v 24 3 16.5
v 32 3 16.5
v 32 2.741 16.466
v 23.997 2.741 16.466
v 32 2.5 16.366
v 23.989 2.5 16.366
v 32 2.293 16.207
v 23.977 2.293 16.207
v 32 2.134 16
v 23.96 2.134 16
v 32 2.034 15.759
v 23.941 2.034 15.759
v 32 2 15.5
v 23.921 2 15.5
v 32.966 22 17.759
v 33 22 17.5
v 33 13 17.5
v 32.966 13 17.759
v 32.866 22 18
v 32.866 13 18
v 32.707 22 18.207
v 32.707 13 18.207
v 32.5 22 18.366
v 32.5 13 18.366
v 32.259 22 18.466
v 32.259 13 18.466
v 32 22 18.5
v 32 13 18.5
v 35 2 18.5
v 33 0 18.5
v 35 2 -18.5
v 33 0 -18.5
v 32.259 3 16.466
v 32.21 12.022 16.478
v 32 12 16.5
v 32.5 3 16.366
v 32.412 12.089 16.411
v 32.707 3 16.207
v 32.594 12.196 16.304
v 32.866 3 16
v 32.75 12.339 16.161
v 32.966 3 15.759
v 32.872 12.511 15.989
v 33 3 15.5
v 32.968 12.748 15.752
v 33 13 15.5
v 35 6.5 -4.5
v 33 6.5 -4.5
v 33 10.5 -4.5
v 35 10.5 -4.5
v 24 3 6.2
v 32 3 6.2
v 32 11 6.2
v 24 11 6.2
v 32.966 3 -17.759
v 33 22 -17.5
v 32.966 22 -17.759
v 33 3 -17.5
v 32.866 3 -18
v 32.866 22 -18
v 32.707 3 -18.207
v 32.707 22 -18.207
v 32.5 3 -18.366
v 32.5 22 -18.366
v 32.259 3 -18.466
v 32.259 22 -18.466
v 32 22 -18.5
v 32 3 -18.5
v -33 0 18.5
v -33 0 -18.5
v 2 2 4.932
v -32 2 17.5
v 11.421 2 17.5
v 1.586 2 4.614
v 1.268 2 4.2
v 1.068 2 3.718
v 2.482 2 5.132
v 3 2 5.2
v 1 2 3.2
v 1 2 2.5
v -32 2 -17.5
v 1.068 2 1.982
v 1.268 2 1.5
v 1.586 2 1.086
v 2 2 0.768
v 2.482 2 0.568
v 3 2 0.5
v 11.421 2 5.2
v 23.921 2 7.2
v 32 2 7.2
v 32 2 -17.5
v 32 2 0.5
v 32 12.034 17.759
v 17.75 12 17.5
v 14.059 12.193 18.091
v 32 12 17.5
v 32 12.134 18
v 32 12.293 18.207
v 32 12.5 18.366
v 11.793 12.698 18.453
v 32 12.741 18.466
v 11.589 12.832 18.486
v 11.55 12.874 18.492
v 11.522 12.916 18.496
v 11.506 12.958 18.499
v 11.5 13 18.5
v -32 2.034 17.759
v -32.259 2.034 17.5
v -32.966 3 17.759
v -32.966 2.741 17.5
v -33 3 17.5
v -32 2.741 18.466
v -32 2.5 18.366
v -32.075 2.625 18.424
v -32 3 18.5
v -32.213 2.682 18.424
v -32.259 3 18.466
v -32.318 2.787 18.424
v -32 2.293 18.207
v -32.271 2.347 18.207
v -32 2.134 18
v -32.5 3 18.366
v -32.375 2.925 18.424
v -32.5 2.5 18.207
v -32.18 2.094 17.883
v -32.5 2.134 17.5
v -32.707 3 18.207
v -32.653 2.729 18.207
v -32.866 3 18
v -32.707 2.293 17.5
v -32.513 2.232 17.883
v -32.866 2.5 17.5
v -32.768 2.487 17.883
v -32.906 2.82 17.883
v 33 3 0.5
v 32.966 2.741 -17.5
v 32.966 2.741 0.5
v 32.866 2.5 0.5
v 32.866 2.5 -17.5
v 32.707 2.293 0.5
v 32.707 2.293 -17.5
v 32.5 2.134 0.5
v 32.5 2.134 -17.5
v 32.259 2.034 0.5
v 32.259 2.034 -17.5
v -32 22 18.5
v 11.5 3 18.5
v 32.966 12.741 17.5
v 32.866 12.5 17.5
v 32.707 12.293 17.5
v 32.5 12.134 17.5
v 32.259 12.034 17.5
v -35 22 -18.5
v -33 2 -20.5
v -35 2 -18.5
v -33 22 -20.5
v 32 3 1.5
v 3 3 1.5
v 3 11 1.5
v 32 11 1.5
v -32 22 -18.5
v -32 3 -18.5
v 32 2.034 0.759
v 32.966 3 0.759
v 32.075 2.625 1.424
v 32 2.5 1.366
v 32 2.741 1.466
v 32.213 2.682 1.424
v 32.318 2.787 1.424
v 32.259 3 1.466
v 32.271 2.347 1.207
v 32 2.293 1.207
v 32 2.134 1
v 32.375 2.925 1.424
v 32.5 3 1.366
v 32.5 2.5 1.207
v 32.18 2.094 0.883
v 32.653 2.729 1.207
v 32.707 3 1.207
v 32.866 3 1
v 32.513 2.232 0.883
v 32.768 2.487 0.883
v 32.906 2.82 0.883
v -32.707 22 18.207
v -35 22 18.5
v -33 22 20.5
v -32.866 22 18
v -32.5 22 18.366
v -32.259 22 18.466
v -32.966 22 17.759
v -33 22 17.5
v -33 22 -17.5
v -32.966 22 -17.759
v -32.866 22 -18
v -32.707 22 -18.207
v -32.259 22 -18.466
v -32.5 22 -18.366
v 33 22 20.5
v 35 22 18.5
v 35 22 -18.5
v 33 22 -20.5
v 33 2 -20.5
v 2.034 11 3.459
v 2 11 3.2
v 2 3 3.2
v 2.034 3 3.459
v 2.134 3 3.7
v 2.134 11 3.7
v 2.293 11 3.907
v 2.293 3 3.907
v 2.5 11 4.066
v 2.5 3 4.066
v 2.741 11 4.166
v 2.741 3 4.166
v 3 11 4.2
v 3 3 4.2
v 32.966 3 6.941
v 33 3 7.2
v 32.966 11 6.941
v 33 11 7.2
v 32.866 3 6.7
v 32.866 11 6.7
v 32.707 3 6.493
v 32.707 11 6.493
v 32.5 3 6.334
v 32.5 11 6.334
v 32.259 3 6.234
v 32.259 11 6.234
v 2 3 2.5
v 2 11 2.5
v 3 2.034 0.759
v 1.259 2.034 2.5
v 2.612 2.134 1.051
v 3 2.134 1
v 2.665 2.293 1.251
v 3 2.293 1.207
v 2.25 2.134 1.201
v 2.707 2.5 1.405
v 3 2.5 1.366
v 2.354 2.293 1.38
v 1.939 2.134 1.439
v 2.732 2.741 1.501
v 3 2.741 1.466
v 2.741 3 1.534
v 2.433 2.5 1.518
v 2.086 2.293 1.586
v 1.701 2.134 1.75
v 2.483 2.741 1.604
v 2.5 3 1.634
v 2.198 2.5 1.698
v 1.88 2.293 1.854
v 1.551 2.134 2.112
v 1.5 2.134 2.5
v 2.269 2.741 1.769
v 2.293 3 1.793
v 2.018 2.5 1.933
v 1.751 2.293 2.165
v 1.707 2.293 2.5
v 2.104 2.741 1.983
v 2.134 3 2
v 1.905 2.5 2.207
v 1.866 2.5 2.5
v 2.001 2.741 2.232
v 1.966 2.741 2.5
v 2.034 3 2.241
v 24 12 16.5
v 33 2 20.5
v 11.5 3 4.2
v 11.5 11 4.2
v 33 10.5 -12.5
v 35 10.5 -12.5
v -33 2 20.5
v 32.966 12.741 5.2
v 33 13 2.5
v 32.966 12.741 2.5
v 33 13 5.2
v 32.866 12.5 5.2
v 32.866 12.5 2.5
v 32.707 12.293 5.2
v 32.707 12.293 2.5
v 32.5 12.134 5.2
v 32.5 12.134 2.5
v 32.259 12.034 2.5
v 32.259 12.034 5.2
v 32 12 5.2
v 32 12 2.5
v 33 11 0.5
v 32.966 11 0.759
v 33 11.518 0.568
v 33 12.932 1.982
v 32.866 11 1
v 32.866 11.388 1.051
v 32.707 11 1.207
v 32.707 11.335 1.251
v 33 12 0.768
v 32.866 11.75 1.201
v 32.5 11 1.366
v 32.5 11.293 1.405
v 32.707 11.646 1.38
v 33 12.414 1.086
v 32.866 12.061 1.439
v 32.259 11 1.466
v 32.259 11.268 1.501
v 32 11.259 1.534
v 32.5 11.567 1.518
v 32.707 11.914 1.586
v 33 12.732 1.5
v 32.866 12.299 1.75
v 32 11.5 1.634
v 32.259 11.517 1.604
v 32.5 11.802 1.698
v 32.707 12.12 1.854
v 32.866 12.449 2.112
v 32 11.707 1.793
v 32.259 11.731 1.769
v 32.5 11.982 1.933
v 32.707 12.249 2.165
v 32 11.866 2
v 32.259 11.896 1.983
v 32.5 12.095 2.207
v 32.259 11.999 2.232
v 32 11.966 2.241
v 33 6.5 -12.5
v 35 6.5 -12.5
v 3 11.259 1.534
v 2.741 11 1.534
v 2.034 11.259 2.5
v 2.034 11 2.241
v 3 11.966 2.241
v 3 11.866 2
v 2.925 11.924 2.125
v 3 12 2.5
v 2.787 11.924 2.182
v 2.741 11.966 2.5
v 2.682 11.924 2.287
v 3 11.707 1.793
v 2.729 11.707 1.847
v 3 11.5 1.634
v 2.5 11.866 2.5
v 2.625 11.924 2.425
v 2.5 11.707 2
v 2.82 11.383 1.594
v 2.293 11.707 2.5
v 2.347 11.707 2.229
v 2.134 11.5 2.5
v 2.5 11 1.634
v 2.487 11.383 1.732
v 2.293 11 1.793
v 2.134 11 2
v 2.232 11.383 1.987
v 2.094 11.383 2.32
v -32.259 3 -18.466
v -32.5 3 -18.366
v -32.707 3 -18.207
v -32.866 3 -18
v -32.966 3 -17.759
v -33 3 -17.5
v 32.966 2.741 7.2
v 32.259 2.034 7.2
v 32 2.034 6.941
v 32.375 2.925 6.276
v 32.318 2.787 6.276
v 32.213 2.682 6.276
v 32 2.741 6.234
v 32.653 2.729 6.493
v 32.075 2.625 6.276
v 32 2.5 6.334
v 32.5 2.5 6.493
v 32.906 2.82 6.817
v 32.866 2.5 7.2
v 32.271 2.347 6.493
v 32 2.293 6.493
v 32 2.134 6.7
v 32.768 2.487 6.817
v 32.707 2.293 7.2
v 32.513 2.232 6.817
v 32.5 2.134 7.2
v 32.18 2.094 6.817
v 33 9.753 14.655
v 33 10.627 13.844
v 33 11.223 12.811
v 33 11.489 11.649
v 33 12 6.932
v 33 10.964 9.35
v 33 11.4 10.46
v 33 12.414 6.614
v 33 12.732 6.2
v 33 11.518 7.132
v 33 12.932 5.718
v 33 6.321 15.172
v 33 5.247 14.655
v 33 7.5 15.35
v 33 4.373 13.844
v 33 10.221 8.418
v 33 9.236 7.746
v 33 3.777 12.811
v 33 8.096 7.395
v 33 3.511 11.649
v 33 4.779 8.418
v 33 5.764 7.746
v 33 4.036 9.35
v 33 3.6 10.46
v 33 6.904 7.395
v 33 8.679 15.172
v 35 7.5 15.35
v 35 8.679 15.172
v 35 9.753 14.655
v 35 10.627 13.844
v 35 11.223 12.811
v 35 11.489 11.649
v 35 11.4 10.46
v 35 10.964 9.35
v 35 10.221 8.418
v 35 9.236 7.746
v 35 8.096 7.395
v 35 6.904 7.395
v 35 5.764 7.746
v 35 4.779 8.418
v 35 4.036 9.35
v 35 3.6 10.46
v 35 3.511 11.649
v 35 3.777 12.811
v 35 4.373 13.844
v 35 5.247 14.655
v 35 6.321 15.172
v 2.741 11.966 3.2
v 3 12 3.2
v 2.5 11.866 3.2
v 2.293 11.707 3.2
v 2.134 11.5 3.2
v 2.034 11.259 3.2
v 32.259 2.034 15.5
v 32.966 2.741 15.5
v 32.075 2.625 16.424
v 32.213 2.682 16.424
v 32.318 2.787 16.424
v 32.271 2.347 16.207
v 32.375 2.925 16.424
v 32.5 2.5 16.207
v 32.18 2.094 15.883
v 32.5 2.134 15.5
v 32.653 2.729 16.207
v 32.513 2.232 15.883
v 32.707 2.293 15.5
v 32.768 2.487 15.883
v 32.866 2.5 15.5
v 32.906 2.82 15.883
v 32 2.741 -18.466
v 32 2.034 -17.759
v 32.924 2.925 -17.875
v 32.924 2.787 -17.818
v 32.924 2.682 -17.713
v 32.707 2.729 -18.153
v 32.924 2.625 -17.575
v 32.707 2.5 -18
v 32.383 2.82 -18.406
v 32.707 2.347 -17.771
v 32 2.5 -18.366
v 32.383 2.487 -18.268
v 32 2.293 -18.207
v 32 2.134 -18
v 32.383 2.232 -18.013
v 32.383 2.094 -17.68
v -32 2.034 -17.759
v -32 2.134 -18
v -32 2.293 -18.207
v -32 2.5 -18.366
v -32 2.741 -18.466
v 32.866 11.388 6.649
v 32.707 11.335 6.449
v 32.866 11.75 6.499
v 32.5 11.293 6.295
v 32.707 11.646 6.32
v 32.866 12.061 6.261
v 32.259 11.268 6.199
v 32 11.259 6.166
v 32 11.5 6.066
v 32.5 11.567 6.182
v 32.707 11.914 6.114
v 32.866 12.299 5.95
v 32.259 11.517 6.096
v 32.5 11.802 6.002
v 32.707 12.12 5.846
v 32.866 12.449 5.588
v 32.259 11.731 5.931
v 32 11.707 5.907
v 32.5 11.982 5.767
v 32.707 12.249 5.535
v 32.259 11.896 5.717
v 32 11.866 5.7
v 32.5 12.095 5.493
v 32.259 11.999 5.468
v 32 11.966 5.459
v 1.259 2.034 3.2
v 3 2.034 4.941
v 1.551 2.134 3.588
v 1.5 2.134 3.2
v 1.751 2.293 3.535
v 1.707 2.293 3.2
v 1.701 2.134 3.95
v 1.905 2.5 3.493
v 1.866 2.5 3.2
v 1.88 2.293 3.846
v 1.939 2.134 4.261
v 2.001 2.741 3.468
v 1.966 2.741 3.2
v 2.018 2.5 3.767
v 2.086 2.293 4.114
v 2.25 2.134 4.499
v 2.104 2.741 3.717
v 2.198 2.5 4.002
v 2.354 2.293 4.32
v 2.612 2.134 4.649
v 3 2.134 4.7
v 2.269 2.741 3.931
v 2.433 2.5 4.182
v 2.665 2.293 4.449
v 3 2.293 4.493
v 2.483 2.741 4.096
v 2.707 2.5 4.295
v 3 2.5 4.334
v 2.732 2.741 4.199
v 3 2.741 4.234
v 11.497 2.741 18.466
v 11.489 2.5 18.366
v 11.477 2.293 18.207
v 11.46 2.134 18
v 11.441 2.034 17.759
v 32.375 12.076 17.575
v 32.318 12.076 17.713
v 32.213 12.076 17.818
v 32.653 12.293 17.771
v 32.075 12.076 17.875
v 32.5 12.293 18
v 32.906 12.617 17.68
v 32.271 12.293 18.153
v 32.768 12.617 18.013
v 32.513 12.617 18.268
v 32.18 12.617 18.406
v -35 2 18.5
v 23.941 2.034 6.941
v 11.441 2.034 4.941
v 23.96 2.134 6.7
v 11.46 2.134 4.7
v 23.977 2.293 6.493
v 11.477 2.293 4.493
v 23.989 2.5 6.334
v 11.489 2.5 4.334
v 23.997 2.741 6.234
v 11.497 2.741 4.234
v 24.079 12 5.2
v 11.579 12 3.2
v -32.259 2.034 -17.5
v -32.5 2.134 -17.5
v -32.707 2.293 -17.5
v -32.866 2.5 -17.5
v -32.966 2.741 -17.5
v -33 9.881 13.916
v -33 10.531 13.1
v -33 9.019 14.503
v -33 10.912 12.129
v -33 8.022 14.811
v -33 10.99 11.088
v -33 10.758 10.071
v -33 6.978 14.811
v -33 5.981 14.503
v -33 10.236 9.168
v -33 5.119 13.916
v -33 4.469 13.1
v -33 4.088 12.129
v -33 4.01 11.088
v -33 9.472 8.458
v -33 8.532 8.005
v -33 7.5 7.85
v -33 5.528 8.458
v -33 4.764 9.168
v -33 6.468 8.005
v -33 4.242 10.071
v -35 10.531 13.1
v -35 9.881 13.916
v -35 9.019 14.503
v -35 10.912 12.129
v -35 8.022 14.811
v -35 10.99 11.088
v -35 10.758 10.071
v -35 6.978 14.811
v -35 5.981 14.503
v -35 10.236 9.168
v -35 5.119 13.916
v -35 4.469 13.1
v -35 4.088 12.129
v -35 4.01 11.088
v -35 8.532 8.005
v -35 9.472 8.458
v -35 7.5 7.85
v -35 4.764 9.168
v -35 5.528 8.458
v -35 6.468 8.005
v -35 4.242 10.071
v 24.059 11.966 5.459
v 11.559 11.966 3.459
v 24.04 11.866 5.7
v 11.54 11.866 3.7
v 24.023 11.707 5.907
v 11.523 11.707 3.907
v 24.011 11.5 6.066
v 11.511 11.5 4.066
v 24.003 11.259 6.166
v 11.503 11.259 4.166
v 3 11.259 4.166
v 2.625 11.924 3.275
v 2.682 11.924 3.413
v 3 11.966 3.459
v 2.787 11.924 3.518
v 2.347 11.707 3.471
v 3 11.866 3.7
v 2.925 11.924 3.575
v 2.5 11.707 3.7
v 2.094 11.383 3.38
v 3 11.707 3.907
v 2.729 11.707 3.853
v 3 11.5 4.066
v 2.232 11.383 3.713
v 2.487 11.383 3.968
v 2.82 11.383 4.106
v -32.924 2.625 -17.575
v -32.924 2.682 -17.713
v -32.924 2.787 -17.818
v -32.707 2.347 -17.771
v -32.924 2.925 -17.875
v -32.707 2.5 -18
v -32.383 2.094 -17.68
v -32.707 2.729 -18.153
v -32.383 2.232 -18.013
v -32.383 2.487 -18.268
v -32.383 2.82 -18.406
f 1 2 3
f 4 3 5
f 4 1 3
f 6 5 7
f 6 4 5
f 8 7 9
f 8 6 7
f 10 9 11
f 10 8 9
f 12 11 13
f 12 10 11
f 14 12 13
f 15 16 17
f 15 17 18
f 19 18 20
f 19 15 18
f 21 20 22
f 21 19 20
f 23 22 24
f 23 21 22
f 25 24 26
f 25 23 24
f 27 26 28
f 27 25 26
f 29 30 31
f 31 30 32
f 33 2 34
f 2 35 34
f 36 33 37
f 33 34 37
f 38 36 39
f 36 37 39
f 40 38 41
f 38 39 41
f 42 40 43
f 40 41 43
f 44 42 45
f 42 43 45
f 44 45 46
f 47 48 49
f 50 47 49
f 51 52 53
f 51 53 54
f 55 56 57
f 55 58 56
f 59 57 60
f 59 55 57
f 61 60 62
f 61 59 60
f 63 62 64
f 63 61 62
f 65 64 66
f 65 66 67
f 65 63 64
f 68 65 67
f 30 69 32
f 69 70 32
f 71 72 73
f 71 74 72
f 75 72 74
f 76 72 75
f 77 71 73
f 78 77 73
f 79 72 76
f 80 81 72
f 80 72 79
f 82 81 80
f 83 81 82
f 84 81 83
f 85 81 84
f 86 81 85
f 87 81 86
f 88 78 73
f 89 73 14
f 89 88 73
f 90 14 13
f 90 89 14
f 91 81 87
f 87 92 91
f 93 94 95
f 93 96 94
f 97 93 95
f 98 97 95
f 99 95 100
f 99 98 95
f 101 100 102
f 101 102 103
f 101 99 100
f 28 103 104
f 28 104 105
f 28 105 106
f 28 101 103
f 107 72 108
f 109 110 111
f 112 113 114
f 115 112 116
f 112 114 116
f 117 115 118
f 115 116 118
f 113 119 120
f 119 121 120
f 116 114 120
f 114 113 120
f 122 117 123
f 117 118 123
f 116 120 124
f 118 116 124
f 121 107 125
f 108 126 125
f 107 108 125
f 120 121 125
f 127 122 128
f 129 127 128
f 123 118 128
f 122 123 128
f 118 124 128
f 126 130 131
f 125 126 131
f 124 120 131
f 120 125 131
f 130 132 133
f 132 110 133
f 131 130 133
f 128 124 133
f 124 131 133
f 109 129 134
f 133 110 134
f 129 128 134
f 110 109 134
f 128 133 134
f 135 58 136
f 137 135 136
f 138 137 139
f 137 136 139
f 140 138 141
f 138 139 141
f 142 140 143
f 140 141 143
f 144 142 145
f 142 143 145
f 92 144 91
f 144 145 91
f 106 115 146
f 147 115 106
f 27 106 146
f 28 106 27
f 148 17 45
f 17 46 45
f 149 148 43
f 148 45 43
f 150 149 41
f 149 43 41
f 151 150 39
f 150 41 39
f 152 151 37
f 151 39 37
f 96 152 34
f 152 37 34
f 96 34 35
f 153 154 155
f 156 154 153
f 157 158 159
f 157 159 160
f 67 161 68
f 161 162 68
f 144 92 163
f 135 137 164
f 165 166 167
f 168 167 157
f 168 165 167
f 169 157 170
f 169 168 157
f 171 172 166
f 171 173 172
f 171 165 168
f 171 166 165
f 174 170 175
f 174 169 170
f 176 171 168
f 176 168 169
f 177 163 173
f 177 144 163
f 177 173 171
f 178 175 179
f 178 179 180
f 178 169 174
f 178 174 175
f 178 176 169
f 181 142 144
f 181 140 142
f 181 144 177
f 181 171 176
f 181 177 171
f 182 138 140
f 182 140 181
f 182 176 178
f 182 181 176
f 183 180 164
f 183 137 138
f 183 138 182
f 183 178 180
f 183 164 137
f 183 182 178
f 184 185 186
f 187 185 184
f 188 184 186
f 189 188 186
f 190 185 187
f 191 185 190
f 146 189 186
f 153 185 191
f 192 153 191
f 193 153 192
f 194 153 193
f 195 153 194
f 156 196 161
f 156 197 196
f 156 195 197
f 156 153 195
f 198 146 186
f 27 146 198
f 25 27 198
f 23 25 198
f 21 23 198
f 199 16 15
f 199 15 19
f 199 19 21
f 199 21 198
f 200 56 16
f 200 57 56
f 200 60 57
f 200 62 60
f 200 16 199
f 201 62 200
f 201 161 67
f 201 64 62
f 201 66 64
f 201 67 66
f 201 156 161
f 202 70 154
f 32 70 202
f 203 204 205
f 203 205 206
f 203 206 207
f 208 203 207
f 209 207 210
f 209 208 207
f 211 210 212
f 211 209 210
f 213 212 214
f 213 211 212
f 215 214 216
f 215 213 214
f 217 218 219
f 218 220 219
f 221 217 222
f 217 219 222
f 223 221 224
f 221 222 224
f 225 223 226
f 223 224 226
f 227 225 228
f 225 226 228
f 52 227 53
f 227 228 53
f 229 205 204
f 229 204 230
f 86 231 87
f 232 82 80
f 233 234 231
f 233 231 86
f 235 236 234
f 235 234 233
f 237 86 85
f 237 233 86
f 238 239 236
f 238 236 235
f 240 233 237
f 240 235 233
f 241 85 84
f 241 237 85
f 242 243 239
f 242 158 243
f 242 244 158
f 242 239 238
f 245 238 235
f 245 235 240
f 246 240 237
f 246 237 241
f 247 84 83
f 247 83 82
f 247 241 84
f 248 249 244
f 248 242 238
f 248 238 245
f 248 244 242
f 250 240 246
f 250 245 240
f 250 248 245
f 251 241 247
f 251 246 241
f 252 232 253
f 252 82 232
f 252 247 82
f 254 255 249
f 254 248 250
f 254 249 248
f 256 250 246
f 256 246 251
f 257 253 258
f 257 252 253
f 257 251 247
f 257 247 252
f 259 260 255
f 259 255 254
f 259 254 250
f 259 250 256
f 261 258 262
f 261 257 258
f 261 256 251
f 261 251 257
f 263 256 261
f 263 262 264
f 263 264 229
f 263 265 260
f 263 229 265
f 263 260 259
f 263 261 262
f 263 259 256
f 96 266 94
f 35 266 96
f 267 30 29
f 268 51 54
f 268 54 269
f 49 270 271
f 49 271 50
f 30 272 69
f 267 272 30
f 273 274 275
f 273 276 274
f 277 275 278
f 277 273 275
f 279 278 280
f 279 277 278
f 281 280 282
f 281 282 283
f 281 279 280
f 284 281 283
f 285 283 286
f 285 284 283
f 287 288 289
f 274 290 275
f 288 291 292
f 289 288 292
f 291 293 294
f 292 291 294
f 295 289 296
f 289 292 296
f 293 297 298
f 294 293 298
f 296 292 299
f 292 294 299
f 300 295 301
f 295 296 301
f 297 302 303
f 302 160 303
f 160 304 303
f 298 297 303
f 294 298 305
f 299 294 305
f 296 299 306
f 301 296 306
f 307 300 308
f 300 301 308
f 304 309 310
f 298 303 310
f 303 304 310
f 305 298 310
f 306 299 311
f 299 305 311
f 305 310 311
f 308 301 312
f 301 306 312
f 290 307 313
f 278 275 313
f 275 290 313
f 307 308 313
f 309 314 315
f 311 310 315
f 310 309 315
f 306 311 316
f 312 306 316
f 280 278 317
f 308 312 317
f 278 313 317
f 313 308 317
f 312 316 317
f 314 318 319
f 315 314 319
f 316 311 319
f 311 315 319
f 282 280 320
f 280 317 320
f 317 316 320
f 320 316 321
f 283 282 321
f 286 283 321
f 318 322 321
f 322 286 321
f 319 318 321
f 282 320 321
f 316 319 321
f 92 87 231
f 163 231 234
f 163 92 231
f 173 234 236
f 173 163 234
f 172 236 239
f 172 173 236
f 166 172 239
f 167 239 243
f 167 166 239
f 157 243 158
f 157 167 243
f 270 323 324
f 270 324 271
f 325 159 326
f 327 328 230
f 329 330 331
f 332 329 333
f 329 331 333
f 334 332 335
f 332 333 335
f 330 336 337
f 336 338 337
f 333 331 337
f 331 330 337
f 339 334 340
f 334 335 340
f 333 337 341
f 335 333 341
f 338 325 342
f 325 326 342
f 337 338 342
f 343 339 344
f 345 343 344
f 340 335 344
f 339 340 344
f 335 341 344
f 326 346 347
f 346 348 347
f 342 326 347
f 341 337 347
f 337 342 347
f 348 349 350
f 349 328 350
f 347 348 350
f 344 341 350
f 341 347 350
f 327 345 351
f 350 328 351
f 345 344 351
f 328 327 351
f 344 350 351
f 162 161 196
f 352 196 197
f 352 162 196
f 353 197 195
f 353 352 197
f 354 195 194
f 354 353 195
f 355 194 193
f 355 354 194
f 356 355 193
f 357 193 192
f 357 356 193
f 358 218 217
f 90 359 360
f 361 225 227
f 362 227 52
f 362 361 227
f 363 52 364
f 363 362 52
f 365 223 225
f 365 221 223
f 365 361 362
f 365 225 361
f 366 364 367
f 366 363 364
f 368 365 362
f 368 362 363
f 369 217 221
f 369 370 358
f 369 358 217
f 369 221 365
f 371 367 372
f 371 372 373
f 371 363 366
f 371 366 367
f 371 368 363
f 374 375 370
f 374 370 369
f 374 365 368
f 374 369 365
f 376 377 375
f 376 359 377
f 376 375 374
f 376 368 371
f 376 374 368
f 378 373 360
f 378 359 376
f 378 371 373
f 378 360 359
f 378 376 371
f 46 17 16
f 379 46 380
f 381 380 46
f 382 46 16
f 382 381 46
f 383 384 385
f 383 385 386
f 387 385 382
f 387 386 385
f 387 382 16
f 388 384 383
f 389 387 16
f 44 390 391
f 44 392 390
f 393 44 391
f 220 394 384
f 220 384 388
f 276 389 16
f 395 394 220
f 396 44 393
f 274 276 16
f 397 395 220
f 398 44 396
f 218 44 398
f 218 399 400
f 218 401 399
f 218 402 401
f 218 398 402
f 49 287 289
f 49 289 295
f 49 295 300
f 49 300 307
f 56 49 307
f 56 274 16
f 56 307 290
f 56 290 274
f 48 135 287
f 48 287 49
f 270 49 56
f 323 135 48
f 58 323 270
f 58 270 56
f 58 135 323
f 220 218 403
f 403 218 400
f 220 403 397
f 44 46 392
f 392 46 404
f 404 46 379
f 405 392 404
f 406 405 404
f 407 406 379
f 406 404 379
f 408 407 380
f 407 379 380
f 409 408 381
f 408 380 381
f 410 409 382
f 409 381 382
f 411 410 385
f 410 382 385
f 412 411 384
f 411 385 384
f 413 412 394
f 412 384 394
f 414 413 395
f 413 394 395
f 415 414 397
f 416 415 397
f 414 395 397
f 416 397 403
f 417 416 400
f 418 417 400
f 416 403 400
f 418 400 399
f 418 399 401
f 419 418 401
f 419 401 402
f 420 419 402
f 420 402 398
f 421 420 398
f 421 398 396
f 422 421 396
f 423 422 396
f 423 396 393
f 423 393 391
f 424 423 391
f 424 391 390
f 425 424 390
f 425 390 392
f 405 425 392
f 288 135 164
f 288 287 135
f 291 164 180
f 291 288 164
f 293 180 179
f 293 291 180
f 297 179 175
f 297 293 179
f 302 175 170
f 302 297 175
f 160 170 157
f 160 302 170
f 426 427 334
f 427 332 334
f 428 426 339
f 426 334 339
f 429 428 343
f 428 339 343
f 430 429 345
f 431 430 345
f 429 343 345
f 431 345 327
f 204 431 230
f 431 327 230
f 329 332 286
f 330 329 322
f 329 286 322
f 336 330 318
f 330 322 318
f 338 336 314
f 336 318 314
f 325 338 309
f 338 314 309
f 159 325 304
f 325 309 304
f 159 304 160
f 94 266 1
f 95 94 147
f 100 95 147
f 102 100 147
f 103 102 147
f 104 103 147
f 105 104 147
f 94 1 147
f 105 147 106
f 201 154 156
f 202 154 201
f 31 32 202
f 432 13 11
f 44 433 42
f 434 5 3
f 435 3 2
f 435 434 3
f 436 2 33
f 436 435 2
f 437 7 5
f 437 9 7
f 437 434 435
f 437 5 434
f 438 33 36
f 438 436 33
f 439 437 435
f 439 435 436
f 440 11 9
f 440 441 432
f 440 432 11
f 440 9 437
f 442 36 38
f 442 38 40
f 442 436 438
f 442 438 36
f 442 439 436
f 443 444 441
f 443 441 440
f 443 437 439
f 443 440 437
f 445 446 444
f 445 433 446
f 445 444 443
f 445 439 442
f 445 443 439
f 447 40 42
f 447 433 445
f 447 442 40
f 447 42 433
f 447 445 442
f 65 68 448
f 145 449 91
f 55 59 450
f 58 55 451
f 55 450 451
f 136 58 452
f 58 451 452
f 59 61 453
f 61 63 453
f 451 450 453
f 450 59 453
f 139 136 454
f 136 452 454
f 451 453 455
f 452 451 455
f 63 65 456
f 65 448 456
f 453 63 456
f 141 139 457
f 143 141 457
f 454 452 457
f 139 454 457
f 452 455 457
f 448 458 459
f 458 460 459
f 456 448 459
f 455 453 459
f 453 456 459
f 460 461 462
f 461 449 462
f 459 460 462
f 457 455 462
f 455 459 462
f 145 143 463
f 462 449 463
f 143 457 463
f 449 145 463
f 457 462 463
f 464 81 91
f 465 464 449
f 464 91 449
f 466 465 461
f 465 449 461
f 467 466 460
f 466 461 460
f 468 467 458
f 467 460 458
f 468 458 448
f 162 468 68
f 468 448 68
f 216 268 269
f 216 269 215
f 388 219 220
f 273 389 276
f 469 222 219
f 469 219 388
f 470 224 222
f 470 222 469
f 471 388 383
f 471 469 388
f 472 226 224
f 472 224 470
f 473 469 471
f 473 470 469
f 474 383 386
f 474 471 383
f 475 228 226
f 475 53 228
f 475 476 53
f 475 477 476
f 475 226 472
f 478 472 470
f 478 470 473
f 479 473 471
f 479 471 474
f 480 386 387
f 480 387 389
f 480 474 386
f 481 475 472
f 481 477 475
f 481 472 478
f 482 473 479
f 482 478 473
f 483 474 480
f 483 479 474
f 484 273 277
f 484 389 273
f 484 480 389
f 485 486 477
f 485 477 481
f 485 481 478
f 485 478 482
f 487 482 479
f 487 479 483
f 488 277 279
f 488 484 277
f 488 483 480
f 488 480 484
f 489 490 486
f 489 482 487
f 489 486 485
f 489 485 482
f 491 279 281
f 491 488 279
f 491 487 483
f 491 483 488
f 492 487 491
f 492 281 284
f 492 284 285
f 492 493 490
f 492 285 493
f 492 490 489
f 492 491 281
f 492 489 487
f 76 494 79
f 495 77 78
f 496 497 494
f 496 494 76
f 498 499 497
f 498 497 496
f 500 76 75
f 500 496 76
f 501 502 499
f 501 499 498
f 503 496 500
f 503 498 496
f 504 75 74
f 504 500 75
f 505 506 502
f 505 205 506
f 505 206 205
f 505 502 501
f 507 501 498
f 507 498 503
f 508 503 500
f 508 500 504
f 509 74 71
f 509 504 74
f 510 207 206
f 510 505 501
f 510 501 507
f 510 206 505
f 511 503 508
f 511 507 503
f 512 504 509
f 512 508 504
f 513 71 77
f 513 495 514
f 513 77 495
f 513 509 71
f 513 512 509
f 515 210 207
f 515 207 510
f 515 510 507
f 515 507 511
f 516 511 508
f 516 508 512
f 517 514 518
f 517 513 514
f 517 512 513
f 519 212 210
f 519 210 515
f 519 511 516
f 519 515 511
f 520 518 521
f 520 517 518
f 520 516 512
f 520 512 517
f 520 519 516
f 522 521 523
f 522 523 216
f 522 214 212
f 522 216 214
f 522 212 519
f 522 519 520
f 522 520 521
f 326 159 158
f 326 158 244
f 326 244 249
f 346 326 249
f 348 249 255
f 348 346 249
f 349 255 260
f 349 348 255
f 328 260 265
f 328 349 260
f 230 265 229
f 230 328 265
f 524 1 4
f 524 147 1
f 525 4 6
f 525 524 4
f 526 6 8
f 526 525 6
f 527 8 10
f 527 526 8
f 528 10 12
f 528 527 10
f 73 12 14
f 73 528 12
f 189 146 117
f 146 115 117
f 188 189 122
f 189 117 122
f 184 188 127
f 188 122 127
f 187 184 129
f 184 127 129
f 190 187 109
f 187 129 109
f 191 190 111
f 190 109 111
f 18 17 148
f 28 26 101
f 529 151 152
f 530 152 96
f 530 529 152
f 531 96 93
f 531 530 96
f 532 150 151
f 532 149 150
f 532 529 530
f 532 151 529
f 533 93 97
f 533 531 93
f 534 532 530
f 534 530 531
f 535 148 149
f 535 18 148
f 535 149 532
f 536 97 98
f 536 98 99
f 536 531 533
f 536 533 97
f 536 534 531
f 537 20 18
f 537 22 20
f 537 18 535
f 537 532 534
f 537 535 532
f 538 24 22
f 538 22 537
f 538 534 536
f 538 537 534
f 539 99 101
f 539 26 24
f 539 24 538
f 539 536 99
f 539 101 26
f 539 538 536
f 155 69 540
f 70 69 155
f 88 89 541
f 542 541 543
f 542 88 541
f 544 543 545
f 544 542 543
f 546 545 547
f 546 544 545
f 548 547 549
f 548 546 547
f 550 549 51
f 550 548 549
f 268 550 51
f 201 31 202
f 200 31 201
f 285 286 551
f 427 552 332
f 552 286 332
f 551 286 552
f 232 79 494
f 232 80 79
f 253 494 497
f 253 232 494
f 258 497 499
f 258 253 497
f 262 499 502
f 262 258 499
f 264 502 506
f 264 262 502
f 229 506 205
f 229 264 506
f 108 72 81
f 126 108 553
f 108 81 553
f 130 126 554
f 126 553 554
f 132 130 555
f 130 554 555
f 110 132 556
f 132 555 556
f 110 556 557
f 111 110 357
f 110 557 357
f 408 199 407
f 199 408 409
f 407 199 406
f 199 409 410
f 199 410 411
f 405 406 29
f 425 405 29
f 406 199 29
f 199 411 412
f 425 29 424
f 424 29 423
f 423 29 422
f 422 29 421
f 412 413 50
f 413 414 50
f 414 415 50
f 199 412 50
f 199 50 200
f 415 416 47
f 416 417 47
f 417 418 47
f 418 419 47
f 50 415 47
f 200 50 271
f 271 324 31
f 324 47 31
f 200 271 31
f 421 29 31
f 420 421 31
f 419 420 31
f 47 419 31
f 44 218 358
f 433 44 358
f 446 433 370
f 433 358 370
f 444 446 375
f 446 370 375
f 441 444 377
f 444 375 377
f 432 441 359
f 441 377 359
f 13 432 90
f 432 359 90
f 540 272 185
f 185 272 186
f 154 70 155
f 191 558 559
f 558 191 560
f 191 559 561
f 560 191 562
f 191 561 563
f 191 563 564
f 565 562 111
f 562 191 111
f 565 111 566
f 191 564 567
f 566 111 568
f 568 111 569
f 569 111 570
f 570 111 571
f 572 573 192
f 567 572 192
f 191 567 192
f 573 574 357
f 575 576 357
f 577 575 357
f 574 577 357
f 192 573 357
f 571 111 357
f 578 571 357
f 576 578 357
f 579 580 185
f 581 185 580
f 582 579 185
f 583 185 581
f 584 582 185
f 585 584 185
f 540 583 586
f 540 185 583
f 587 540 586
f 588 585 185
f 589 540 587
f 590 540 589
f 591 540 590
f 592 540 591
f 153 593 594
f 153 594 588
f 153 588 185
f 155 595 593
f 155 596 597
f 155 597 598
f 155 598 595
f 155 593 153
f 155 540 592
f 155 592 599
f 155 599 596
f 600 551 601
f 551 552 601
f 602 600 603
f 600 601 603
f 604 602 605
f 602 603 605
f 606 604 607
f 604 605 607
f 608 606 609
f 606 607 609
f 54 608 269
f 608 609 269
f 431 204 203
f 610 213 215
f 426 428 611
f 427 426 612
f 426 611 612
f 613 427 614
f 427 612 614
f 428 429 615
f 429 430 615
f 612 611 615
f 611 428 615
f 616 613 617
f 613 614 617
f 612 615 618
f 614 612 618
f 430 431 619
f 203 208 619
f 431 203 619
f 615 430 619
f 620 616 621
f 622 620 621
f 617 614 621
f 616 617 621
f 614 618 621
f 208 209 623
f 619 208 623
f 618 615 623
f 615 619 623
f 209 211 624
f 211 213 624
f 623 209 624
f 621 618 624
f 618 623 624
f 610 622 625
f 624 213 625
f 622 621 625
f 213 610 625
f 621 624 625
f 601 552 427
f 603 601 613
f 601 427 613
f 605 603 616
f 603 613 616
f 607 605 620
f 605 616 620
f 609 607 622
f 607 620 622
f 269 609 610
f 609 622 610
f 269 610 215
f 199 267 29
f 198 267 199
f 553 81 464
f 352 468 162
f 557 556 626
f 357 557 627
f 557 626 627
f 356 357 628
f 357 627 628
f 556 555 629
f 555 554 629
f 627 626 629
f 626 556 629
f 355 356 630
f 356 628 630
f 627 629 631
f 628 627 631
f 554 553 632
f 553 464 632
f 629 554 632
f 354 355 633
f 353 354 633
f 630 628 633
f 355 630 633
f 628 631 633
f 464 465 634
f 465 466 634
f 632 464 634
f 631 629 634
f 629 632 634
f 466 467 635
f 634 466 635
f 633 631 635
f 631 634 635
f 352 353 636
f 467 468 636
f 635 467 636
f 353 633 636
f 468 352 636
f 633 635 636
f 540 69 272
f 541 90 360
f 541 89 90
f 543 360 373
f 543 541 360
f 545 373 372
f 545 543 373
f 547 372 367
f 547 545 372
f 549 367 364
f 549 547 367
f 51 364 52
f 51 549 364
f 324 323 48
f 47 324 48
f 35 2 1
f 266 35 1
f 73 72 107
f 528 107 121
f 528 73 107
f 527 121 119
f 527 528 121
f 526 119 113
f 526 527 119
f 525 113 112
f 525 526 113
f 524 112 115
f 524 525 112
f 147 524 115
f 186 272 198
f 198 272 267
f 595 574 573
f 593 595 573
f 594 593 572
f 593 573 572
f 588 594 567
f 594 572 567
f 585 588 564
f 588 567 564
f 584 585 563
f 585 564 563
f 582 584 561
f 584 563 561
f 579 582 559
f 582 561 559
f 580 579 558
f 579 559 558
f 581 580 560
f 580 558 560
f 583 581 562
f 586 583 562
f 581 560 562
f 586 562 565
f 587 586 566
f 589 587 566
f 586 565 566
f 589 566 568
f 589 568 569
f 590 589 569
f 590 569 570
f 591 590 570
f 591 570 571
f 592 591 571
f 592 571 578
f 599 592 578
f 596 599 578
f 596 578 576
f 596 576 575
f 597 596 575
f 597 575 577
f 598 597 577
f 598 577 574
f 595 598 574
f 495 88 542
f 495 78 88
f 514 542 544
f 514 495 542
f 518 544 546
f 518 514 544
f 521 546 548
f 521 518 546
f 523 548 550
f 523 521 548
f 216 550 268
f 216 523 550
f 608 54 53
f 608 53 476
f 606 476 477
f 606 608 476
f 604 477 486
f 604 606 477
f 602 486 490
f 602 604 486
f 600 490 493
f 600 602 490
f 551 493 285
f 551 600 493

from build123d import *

# Parameters (mm, degrees)
ESQUISSE1_W             = 70
ESQUISSE1_H             = 41
BOSS_EXTRU_1_DEPTH      = 22
COQUE1_T                = -2
BOSS_EXTRU_2_DEPTH      = 10
ENL_V_MAT_EXTRU_1_REACH = 76.352
ESQUISSE3_R             = 4
ESQUISSE3_W             = 8
ESQUISSE3_H             = 4
ENL_V_MAT_EXTRU_2_REACH = 76.352
ESQUISSE4_R             = 3.5
CONG_1_R                = 1
CHANFREIN1_SIZE         = 2


with BuildPart() as part:
    # Esquisse1 → Boss.-Extru.1 (new body)
    with BuildSketch(Plane(origin=(0, 0, 0), x_dir=(1, 0, 0), z_dir=(0, 1, 0))):
        Rectangle(ESQUISSE1_W, ESQUISSE1_H)
    extrude(amount=BOSS_EXTRU_1_DEPTH)

    # Coque1
    coque1_openings = [part.faces().sort_by_distance(p)[0] for p in [
        (0, 22, 0),
    ]]
    offset(amount=COQUE1_T, openings=coque1_openings, kind=Kind.INTERSECTION)

    # Esquisse2 → Boss.-Extru.2 (add)
    with BuildSketch(Plane(origin=(0, 2, 0), x_dir=(1, 0, 0), z_dir=(0, 1, 0))):
        Polygon((33, -16.5), (24, -16.5), (11.5, -18.5), (33, -18.5), align=None)
        Polygon((33, -6.2), (24, -6.2), (11.5, -4.2), (2, -4.2), (2, -1.5), (33, -1.5), align=None)
    extrude(amount=BOSS_EXTRU_2_DEPTH)

    # Esquisse3 → Enlèv. mat.-Extru.1 (cut, up to next)
    with BuildSketch(Plane.ZY.offset(-33), mode=Mode.PRIVATE) as enl_v_mat_extru_1_sk1:
        with Locations((11.35, 7.5)):
            Circle(ESQUISSE3_R)
    enl_v_mat_extru_1_tool1 = extrude(enl_v_mat_extru_1_sk1.sketch, amount=-ENL_V_MAT_EXTRU_1_REACH, mode=Mode.PRIVATE) & part.part
    # Esquisse3 → Enlèv. mat.-Extru.1 (cut, up to next)
    with BuildSketch(Plane.ZY.offset(-33), mode=Mode.PRIVATE) as enl_v_mat_extru_1_sk2:
        with Locations((-8.5, 8.5)):
            Rectangle(ESQUISSE3_W, ESQUISSE3_H)
    enl_v_mat_extru_1_tool2 = extrude(enl_v_mat_extru_1_sk2.sketch, amount=-ENL_V_MAT_EXTRU_1_REACH, mode=Mode.PRIVATE) & part.part
    add(enl_v_mat_extru_1_tool1.solids().sort_by_distance((33, 7.5, 11.35))[0], mode=Mode.SUBTRACT)
    add(enl_v_mat_extru_1_tool2.solids().sort_by_distance((33, 8.5, -8.5))[0], mode=Mode.SUBTRACT)

    # Esquisse4 → Enlèv. mat.-Extru.2 (cut, up to next)
    with BuildSketch(Plane(origin=(-33, 0, 0), x_dir=(0, 0, -1), z_dir=(1, 0, 0)), mode=Mode.PRIVATE) as enl_v_mat_extru_2_sk1:
        with Locations((-11.35, 7.5)):
            Circle(ESQUISSE4_R)
    enl_v_mat_extru_2_tool1 = extrude(enl_v_mat_extru_2_sk1.sketch, amount=-ENL_V_MAT_EXTRU_2_REACH, mode=Mode.PRIVATE) & part.part
    add(enl_v_mat_extru_2_tool1.solids().sort_by_distance((-33, 7.5, 11.35))[0], mode=Mode.SUBTRACT)

    # Congé1
    cong_1_edges = [part.edges().sort_by_distance(p)[0] for p in [
        (33, 17, 18.5),
        (0, 2, -18.5),
        (33, 12, -18.5),
        (-33, 2, 0),
        (-33, 12, -18.5),
        (-10.75, 2, 18.5),
        (-33, 12, 18.5),
        (33, 2, 11.35),
        (28.5, 2, 16.5),
        (33, 7, 16.5),
        (17.75, 2, 17.5),
        (33, 12, 17.5),
        (22.25, 12, 18.5),
        (33, 2, -8.5),
        (33, 7, 6.2),
        (17.5, 2, 1.5),
        (33, 7, 1.5),
        (2, 2, 2.85),
        (2, 7, 1.5),
        (6.75, 2, 4.2),
        (2, 7, 4.2),
        (17.75, 2, 5.2),
        (28.5, 2, 6.2),
        (33, 12, 3.85),
        (17.5, 12, 1.5),
        (2, 12, 2.85),
        (6.75, 12, 4.2),
        (17.75, 12, 5.2),
        (28.5, 12, 6.2),
    ]]
    fillet(cong_1_edges, radius=CONG_1_R)

    # Chanfrein1
    chanfrein1_edges = [part.edges().sort_by_distance(p)[0] for p in [
        (0, 0, 20.5),
        (-35, 0, 0),
        (0, 0, -20.5),
        (35, 0, 0),
        (35, 11, 20.5),
        (-35, 11, 20.5),
        (-35, 11, -20.5),
        (35, 11, -20.5),
    ]]
    chamfer(chanfrein1_edges, length=CHANFREIN1_SIZE)


solid = part.part
